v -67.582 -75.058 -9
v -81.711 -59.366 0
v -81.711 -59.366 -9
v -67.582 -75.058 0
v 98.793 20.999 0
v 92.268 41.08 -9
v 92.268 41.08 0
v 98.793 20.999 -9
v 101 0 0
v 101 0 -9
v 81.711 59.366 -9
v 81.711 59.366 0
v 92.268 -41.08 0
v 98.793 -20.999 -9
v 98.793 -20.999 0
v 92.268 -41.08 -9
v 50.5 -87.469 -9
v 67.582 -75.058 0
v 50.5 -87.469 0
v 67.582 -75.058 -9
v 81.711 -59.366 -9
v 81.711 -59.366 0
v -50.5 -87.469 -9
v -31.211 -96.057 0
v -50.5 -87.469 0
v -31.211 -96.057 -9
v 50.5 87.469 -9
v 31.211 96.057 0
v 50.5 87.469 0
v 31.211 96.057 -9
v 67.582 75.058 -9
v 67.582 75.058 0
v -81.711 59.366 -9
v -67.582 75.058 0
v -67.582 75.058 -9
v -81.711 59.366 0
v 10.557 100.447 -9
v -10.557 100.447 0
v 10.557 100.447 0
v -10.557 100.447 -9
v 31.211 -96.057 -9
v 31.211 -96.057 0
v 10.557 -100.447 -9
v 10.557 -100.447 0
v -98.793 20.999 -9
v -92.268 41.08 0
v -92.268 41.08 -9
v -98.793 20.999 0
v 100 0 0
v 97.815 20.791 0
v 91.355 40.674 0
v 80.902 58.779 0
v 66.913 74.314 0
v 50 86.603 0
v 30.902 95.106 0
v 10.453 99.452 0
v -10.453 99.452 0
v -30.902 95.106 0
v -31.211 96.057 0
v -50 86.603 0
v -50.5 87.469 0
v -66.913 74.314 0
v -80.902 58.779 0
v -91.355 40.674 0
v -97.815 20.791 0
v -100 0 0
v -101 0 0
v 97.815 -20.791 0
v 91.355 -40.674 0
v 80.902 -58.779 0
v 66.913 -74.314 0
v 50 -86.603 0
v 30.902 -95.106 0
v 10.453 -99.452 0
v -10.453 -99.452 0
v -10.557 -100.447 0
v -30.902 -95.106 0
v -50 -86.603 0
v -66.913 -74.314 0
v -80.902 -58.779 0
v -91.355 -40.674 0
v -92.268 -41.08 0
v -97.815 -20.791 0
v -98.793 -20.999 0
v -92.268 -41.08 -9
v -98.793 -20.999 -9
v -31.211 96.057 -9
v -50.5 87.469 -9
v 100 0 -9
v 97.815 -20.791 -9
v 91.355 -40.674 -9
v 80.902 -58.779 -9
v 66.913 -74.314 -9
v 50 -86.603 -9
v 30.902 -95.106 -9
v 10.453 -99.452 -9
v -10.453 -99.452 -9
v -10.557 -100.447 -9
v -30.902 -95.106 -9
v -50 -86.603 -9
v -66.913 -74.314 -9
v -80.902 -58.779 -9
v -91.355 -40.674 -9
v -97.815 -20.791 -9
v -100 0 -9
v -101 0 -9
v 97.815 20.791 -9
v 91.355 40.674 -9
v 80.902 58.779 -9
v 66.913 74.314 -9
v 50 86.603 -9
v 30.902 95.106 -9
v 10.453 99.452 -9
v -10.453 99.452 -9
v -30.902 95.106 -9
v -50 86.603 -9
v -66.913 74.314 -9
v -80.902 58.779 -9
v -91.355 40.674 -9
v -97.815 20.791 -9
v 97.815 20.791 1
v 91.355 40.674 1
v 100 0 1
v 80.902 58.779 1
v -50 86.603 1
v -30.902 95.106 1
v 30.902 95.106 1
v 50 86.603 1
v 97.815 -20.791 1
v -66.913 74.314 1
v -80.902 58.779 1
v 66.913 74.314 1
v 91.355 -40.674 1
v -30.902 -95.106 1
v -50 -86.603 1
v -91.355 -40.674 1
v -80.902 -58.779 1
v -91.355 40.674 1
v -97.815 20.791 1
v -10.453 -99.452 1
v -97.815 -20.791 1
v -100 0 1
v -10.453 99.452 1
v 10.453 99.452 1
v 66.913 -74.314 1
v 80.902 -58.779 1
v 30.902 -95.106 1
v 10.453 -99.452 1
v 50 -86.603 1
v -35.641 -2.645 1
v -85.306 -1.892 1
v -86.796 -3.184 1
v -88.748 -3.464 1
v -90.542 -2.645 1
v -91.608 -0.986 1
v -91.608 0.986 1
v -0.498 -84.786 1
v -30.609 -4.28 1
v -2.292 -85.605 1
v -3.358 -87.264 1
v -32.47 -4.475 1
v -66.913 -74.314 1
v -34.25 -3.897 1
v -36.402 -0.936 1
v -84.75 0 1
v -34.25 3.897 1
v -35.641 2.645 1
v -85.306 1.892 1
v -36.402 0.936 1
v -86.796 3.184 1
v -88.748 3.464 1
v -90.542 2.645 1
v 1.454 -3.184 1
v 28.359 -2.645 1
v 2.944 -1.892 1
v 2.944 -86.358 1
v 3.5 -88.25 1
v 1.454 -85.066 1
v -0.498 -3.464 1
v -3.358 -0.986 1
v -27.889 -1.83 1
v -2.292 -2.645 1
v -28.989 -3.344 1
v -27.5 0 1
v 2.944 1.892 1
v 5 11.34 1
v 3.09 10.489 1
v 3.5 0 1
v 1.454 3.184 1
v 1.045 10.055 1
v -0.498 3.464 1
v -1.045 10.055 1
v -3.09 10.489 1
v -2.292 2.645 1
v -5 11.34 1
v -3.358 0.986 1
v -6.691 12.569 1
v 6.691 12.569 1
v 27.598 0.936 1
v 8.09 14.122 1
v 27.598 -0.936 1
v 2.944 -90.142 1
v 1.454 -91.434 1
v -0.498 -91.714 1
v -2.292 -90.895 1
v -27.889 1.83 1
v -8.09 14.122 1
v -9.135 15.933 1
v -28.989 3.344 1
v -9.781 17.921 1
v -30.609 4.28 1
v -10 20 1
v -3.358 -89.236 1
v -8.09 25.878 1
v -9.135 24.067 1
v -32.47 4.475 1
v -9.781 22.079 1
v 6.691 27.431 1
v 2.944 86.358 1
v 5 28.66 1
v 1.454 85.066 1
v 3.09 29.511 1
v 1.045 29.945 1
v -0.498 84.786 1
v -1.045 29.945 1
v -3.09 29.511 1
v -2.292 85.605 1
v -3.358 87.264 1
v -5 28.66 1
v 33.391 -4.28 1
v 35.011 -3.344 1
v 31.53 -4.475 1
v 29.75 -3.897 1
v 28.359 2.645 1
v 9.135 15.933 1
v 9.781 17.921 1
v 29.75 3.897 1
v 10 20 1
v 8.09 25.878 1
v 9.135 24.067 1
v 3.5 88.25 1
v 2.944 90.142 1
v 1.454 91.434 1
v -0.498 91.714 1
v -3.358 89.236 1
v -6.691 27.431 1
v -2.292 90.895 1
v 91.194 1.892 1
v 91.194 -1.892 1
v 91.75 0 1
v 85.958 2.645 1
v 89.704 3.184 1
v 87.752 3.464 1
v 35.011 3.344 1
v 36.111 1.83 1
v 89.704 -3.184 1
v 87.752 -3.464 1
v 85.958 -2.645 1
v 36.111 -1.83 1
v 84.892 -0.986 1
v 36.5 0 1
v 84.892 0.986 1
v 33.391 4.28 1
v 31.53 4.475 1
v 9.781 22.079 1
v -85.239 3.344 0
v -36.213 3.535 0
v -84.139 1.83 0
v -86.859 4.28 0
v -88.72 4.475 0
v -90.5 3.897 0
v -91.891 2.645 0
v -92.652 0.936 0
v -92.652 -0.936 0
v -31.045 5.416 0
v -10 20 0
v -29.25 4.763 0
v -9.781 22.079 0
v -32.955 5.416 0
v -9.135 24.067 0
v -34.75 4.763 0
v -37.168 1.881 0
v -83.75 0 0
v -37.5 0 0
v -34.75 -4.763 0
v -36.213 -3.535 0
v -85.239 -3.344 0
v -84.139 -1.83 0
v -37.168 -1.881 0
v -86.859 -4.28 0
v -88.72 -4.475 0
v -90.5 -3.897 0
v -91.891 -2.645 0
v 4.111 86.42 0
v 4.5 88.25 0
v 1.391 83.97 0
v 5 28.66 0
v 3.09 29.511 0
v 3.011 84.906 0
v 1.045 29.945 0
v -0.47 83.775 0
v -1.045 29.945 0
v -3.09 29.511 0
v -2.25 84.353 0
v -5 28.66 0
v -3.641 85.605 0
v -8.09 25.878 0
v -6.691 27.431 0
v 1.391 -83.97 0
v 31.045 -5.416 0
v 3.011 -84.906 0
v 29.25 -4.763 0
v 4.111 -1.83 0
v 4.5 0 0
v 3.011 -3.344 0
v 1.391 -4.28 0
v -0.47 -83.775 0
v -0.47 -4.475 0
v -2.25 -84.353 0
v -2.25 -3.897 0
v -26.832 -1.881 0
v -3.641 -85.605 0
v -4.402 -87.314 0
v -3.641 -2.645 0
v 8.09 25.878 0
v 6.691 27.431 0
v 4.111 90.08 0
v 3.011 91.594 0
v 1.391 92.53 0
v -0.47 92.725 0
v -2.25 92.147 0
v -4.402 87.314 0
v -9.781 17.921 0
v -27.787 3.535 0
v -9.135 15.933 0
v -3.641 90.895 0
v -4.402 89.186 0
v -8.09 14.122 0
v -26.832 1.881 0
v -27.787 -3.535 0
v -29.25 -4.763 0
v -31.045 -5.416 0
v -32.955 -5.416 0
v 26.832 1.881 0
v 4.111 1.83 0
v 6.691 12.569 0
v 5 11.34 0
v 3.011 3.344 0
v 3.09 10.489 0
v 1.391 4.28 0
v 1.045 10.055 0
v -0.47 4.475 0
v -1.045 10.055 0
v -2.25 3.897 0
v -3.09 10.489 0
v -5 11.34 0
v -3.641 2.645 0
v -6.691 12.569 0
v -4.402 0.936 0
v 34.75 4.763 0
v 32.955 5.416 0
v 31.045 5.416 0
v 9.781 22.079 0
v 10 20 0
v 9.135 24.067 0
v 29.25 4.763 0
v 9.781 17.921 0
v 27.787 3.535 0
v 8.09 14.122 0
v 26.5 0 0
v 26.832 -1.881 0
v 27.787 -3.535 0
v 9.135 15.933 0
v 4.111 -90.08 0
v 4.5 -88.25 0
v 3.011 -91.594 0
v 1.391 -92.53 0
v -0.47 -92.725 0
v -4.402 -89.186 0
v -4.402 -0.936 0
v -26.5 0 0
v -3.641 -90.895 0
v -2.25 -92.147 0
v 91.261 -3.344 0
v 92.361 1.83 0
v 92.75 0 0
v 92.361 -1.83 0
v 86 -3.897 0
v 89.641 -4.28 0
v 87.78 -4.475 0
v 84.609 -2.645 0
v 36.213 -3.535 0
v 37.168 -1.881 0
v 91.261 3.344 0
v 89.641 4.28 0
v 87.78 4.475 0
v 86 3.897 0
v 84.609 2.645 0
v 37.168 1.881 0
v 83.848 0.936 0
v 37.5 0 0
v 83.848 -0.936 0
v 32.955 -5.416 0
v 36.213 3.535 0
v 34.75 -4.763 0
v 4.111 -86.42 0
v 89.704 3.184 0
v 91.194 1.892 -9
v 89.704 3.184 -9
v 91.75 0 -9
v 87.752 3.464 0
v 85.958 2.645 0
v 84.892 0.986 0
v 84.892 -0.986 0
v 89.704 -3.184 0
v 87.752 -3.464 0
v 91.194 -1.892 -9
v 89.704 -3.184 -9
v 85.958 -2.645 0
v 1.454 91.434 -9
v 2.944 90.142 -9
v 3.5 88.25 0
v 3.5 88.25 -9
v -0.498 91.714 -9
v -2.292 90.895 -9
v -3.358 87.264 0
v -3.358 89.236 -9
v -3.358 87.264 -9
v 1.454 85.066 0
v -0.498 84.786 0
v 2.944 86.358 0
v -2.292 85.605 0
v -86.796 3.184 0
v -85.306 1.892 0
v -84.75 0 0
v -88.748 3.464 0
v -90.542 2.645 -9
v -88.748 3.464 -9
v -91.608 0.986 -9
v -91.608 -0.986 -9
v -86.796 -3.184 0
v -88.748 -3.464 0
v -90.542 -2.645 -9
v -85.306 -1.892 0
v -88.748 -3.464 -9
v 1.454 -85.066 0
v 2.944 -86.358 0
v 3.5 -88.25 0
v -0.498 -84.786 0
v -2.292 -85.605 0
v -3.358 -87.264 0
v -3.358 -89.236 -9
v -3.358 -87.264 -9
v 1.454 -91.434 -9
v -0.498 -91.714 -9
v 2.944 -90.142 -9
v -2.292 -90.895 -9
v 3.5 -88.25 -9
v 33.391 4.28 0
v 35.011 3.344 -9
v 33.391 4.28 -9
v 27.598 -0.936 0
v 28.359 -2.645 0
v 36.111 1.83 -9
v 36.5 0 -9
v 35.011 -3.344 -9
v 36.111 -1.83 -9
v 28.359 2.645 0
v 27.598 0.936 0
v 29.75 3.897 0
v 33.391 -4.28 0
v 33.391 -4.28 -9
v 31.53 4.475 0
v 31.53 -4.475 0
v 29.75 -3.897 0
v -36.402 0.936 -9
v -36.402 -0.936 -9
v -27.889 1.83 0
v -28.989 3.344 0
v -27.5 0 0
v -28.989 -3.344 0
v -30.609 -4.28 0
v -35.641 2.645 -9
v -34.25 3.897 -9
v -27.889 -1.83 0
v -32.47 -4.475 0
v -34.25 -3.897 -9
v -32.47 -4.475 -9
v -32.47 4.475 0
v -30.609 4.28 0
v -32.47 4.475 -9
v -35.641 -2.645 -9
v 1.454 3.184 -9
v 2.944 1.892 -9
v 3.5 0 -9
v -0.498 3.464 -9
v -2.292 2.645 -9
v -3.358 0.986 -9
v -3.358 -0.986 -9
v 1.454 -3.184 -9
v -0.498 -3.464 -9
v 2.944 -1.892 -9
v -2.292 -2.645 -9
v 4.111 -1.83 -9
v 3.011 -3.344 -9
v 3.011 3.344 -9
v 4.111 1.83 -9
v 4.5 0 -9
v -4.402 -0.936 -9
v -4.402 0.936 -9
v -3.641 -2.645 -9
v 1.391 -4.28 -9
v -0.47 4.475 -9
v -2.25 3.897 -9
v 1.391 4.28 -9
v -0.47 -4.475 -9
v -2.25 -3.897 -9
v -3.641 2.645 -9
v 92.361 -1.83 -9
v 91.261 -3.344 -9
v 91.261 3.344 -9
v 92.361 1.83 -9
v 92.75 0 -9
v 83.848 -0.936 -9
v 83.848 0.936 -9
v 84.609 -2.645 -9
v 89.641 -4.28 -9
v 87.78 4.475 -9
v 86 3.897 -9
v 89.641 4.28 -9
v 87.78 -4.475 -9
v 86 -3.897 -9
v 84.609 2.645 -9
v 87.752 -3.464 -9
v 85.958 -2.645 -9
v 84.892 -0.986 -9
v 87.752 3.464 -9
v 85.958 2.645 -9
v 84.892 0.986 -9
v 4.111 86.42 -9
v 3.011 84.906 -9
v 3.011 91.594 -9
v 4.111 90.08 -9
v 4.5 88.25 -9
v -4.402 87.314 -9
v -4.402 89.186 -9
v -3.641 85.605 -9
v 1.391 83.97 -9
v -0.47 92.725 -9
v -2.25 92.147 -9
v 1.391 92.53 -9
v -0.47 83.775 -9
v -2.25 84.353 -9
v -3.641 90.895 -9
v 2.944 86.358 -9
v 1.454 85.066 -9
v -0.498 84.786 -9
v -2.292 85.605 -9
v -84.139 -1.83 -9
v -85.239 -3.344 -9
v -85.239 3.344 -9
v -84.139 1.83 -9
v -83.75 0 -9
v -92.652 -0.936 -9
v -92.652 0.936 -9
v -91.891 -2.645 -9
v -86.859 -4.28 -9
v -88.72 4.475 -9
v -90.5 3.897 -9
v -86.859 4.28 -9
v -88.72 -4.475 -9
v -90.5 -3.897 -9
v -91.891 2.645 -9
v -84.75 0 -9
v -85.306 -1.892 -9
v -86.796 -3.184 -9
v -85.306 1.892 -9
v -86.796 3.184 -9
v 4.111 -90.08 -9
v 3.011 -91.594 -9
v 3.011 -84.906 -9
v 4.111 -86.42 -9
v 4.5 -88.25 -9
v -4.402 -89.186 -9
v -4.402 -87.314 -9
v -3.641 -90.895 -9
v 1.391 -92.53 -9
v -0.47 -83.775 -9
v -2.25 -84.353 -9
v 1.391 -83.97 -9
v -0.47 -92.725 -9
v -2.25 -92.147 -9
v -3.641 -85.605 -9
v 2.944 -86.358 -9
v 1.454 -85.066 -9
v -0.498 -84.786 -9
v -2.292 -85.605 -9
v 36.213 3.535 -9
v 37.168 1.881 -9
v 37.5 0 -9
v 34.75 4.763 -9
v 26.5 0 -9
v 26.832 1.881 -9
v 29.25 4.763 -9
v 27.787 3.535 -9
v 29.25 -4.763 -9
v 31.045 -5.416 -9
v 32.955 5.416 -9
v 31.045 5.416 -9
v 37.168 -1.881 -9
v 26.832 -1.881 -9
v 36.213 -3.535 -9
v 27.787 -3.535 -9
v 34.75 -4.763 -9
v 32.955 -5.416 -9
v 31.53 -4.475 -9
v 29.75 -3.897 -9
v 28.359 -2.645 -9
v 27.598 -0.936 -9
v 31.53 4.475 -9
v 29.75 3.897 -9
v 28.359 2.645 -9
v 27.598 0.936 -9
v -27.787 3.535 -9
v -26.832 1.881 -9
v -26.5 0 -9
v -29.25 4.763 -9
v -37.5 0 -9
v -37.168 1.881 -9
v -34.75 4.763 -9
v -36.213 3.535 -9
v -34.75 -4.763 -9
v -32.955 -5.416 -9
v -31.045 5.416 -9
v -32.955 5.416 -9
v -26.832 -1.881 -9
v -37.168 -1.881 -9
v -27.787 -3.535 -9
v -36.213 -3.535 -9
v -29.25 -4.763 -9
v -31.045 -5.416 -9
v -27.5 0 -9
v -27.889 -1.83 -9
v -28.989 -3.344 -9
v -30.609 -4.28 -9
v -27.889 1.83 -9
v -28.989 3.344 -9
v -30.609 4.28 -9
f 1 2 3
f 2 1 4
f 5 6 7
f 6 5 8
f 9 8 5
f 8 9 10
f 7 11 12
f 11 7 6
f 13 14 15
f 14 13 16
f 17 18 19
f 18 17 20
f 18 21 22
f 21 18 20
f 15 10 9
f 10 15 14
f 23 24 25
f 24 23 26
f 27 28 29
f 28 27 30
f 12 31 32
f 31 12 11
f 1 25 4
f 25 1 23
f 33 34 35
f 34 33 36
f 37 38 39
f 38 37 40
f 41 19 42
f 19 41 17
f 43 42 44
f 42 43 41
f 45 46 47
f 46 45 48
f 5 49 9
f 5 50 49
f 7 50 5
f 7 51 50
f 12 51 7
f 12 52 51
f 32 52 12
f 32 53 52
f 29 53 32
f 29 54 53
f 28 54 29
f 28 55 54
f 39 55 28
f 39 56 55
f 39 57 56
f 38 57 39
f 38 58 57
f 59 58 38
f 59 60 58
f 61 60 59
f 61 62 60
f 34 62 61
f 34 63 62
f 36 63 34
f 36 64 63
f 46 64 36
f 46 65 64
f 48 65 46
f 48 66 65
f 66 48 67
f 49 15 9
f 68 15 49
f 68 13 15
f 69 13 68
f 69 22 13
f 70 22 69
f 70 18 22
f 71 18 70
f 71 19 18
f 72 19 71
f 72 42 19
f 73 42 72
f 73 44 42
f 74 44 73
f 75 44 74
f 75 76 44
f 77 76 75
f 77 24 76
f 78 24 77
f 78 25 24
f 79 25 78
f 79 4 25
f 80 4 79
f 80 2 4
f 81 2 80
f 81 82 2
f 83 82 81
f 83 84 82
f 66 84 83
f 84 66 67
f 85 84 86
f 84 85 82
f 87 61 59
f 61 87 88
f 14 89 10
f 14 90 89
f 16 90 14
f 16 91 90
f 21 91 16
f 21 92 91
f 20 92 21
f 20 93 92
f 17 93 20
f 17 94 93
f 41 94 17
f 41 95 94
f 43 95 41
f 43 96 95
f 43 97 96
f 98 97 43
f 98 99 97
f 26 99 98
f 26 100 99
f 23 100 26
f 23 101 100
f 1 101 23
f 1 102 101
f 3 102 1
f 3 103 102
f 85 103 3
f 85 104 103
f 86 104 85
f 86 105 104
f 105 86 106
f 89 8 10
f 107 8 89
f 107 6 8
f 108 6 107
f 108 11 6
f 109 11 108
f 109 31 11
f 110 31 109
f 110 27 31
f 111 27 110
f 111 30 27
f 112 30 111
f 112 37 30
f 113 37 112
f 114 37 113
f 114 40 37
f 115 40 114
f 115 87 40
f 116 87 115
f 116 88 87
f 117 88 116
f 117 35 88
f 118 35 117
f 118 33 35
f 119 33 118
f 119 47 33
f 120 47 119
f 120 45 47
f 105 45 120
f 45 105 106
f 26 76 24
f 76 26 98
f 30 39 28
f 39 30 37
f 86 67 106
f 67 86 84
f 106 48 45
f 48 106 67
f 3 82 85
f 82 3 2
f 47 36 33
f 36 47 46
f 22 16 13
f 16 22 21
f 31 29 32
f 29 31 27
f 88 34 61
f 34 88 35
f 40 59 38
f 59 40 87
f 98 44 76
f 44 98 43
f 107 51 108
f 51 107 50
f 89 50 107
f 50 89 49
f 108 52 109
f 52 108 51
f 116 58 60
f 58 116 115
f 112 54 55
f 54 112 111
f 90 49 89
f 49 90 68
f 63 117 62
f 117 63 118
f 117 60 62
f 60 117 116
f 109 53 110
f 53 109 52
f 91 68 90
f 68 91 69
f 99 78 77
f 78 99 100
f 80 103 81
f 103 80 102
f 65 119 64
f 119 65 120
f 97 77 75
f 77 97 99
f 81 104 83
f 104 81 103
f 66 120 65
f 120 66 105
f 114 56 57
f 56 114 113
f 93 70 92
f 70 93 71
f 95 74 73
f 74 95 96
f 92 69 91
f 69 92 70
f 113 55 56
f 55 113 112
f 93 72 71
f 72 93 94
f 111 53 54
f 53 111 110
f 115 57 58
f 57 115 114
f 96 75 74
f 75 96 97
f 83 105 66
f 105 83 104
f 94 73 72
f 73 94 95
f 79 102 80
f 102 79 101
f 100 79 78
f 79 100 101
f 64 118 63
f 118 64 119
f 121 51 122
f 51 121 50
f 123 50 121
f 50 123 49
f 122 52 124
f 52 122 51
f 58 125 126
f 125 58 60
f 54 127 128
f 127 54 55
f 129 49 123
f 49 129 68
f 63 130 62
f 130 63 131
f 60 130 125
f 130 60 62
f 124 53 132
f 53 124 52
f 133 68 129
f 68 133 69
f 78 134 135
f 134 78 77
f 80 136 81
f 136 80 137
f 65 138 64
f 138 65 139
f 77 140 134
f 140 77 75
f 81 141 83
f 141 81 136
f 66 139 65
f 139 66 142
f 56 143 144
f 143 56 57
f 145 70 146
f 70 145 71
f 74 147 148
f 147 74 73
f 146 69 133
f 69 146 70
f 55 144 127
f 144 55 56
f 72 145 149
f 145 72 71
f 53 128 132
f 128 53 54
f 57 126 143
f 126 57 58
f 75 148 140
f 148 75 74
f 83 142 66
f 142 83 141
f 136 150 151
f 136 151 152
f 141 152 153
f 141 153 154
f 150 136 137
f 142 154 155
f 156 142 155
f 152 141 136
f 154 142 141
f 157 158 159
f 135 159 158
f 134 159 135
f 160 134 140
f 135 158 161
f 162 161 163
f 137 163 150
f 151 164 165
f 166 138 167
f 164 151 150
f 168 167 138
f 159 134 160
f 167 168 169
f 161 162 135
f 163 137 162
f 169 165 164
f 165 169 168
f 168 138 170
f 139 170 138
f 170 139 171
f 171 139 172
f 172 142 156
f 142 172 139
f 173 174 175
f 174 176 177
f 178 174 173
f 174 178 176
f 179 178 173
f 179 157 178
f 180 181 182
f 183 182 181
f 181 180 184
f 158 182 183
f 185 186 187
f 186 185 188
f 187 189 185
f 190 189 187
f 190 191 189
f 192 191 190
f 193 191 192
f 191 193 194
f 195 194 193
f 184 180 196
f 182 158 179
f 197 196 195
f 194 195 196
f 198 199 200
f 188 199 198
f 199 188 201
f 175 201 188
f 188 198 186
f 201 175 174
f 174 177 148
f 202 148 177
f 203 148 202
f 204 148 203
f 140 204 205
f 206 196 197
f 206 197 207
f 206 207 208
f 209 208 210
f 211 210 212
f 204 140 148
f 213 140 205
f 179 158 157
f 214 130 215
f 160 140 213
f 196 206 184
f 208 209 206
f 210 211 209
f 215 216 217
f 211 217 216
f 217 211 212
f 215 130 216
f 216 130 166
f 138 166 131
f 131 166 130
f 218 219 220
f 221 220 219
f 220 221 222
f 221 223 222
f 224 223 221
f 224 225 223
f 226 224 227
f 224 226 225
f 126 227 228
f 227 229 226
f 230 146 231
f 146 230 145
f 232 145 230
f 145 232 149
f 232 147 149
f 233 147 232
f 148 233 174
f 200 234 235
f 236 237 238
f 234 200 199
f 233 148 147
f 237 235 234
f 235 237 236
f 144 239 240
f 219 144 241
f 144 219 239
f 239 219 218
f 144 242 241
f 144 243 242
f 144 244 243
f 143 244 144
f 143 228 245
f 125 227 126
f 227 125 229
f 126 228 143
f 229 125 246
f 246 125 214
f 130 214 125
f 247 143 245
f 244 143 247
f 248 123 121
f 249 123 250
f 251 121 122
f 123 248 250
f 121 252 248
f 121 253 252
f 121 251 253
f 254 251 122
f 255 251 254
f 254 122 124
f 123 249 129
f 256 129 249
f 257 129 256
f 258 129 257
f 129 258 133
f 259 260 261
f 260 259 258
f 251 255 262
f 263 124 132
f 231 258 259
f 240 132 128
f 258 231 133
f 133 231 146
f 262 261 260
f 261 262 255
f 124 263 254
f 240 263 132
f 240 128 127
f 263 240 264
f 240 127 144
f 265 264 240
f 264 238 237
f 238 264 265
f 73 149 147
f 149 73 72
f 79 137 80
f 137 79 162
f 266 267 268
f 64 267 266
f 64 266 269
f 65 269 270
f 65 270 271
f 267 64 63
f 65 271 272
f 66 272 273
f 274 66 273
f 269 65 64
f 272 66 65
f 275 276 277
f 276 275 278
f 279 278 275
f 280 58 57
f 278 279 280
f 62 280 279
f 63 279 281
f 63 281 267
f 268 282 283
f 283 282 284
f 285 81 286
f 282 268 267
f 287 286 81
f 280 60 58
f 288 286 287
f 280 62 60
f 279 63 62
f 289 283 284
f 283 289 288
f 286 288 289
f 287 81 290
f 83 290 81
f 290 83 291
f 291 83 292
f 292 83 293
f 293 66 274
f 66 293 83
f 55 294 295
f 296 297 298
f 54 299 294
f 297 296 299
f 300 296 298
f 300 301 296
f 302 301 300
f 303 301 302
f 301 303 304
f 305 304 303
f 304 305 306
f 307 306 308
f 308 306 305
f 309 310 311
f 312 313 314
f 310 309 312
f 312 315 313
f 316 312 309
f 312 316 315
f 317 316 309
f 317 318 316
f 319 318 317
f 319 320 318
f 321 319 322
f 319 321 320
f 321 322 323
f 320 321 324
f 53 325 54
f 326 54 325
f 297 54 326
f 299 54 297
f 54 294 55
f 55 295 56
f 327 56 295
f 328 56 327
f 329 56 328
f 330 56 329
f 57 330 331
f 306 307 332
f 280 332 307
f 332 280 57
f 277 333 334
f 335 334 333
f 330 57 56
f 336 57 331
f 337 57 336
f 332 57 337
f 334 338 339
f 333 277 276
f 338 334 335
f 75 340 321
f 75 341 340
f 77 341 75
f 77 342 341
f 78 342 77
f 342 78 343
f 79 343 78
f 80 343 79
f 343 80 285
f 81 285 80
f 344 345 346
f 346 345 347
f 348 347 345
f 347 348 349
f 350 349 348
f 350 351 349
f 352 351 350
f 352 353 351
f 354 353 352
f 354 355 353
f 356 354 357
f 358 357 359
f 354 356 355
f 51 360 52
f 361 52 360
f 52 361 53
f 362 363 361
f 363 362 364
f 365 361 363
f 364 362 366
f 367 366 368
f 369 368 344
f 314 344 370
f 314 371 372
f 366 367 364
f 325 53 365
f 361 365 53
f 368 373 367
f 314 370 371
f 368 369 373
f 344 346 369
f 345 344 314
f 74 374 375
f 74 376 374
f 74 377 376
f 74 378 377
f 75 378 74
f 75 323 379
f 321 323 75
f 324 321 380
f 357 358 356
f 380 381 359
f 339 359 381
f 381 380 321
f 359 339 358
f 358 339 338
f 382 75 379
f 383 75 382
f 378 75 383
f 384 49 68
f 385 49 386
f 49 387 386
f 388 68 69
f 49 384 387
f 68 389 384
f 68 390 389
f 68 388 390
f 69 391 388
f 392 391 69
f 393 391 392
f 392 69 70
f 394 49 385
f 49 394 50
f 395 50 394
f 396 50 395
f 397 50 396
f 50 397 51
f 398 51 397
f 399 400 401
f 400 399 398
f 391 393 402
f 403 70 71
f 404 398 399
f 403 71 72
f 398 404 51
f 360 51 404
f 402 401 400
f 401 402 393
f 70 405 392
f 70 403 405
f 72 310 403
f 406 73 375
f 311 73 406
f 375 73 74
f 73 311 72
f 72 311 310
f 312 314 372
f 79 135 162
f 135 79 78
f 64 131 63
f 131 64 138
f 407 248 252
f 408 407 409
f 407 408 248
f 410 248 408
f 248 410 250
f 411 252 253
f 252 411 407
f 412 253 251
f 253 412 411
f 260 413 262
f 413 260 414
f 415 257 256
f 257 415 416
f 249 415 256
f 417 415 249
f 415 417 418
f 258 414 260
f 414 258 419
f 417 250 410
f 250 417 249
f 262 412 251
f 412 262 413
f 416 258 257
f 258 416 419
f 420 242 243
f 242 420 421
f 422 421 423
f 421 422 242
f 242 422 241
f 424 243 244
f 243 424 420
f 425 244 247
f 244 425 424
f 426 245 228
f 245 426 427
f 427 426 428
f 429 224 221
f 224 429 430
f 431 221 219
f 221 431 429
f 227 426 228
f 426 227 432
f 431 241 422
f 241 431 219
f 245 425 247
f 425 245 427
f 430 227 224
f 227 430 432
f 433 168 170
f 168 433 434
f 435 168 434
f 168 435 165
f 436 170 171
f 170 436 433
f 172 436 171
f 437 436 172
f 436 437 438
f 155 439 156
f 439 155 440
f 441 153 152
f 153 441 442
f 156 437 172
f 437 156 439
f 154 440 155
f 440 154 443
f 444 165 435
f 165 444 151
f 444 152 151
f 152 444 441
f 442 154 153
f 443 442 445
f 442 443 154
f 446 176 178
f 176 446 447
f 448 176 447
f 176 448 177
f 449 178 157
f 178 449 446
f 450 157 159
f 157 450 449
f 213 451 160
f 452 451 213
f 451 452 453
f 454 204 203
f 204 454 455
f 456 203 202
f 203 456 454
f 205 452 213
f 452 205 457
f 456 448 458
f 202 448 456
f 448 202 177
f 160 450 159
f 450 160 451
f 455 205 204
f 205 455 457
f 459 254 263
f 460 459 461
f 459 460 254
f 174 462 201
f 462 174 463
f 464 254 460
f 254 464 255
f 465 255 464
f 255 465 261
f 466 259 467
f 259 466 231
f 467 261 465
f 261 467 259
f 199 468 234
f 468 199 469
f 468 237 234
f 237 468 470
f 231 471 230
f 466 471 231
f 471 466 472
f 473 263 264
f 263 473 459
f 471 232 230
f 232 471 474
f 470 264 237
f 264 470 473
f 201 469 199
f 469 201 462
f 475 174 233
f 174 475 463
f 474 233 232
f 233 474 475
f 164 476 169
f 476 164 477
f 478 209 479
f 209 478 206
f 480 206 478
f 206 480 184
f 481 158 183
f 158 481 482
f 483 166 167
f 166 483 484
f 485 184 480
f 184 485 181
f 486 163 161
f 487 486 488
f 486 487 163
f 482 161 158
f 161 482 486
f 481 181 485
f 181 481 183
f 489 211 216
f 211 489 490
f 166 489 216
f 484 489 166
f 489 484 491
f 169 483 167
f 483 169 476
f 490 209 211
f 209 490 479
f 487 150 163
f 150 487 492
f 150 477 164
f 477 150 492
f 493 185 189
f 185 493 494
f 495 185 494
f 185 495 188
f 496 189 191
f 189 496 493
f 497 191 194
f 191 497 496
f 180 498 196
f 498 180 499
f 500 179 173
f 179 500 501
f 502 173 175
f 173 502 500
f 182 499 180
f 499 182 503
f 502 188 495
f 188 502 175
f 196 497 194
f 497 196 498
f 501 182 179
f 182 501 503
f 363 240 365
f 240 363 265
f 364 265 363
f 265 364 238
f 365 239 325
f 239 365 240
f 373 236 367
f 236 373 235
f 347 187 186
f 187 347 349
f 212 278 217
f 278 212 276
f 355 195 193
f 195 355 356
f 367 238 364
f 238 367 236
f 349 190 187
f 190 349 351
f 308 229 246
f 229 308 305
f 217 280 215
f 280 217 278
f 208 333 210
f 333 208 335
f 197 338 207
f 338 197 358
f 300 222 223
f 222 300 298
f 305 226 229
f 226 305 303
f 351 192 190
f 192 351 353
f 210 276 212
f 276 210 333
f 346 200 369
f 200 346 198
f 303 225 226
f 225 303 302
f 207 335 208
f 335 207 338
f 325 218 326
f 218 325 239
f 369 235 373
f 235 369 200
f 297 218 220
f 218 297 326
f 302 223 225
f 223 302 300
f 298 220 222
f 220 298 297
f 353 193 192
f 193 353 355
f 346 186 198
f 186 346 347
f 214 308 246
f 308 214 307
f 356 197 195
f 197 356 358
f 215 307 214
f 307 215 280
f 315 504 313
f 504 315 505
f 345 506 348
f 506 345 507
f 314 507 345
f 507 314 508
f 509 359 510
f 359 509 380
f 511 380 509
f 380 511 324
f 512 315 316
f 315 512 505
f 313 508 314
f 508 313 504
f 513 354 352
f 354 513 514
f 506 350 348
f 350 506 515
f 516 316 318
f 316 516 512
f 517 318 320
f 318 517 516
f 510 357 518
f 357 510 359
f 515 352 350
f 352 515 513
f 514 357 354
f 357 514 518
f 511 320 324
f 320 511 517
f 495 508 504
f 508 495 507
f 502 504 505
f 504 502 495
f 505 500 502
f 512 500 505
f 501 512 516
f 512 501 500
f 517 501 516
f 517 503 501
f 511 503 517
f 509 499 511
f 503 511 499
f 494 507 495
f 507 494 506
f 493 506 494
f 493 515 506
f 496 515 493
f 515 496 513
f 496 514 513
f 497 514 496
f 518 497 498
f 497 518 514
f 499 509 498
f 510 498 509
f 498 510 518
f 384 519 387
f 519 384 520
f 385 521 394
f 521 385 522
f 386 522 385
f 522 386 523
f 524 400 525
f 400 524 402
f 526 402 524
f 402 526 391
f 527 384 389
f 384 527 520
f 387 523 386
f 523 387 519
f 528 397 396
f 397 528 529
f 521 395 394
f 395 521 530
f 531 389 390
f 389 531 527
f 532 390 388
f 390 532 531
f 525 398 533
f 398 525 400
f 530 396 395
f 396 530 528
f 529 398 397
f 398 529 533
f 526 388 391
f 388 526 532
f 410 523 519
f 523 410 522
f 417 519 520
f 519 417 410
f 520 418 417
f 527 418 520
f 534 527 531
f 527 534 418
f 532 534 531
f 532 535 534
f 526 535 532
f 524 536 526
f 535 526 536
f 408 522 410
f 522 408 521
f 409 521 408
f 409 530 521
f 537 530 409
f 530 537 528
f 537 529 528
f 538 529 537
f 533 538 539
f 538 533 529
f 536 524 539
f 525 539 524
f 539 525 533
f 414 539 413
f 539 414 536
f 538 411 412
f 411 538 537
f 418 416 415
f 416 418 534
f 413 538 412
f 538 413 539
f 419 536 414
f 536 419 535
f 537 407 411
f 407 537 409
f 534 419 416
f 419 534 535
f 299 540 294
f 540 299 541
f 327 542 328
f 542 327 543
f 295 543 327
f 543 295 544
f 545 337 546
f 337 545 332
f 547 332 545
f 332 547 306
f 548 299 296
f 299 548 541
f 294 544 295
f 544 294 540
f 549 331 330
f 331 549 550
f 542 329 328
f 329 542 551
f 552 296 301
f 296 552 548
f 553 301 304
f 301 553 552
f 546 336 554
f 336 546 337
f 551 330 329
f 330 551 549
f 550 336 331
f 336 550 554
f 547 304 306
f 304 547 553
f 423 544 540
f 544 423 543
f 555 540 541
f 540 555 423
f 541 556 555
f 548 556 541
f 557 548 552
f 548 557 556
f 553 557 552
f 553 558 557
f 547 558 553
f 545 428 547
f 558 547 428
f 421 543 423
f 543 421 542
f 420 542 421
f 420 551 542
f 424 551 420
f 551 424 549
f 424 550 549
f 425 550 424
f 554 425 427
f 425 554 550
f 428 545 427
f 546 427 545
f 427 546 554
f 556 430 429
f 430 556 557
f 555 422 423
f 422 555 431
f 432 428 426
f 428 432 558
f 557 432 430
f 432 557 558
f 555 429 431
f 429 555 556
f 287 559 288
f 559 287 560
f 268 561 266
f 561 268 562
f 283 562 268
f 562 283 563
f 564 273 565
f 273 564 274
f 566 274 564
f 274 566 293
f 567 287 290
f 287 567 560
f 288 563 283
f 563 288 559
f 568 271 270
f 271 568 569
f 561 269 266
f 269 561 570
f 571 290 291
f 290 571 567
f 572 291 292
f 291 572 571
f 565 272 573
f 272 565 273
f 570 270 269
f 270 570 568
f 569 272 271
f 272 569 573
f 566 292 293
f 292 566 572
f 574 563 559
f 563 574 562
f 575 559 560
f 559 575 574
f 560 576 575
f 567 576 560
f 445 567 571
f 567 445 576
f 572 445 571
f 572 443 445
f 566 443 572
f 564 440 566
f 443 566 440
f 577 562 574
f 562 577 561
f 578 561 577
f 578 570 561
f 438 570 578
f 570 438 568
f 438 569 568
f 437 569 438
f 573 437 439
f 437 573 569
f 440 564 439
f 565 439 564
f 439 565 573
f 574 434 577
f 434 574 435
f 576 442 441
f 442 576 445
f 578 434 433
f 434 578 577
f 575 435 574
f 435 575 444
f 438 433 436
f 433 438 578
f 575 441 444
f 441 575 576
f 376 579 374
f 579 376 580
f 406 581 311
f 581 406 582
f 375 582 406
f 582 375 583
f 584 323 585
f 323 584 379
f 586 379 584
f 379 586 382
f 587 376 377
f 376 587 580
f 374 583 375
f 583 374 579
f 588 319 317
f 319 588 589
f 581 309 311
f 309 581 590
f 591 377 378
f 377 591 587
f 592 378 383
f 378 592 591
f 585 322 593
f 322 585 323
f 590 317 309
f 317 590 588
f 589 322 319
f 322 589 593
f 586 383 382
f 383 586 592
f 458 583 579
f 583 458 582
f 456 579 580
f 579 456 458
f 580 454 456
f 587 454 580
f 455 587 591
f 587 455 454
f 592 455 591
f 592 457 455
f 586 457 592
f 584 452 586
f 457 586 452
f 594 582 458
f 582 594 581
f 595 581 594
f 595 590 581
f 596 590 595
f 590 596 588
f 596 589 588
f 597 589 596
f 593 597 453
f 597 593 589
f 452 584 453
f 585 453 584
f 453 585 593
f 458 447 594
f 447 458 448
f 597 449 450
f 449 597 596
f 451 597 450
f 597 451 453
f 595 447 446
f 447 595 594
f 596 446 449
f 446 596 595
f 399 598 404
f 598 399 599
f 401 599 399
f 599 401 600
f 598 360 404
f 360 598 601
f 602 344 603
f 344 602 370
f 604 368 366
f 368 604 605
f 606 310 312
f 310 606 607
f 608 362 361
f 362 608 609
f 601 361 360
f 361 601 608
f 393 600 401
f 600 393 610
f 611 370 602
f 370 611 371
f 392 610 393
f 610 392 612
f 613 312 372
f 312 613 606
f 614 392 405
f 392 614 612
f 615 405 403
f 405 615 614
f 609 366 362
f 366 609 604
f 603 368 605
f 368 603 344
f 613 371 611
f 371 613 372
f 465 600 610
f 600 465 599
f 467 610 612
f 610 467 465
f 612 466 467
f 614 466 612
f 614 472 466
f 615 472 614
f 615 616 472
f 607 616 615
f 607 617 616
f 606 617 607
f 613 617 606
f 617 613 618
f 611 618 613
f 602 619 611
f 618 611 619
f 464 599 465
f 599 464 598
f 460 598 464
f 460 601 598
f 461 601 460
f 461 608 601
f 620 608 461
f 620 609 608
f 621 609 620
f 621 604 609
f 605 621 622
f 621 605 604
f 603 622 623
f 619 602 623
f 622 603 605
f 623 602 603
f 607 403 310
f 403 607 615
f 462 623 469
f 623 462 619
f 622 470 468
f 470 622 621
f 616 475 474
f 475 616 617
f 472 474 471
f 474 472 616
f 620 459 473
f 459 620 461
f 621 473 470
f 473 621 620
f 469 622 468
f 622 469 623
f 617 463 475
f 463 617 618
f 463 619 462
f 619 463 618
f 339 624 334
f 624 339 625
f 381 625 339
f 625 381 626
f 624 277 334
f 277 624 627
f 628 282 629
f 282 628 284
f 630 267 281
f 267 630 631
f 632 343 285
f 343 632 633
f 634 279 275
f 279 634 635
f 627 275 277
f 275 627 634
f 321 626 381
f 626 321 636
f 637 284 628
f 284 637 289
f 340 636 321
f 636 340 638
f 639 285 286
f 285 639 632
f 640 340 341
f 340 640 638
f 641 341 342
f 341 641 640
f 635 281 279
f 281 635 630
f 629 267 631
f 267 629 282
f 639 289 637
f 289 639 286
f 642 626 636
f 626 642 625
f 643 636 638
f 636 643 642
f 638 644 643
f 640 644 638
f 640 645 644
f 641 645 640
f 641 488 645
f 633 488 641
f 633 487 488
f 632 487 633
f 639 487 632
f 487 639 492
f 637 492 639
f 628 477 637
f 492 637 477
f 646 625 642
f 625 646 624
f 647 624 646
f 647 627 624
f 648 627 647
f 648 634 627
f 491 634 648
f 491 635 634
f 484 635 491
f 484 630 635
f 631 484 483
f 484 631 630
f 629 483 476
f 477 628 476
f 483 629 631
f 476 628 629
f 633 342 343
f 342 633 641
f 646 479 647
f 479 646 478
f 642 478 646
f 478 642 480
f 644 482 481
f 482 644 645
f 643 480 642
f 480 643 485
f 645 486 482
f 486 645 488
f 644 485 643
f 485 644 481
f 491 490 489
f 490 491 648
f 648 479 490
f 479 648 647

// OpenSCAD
radius = 100;
outerBorderThickness = 1;

innerRadius = 39;
innerBorderThickness = 1;

bottomThickness = 1;
height = 10 - bottomThickness;



holeDistanceFromSide = 11.75;
guiderRodDistanceFromMiddle = 32;
tubeHoldeDistanceFromMiddle = 20;

rodBorderThickness = 1;
threadedRodRadius = 3.5;
guiderRodRadius = 4 + .5;

tubeHoleRadius = 10;




mirror([0, 0, 1]) {
    
    // Main frame
    pillar(radius, outerBorderThickness, height);
    //pillar(innerRadius, innerBorderThickness, 1);

    // Bottom plate
    difference() {
        // Plate
        translate([0, 0, -bottomThickness]) {
            cylinder(bottomThickness, radius, radius);
        }
        
        // threaded rods
        translate([radius - holeDistanceFromSide, 0, -bottomThickness]) {
            cylinder(bottomThickness, threadedRodRadius, threadedRodRadius);
        }
        translate([0, radius - holeDistanceFromSide, -bottomThickness]) {
            cylinder(bottomThickness, threadedRodRadius, threadedRodRadius);
        }

        translate([-(radius - holeDistanceFromSide), 0, -bottomThickness]) {
            cylinder(bottomThickness, threadedRodRadius, threadedRodRadius);
        }

        translate([0, -(radius - holeDistanceFromSide), -bottomThickness]) {
            cylinder(bottomThickness, threadedRodRadius, threadedRodRadius);
        }
           
        
        
        // Inner rods: guide and threaded
            
        translate([guiderRodDistanceFromMiddle, 0, -bottomThickness]) {
            cylinder(bottomThickness, guiderRodRadius, guiderRodRadius);
        }

        translate([-guiderRodDistanceFromMiddle, 0, -bottomThickness]) {
            cylinder(bottomThickness, guiderRodRadius, guiderRodRadius);
        }

        translate([0, 0, -bottomThickness]) {
            cylinder(bottomThickness, threadedRodRadius, threadedRodRadius);
        }
        
        // Tube Hole
        translate([0, tubeHoldeDistanceFromMiddle, -bottomThickness]) {
            cylinder(bottomThickness, tubeHoleRadius, tubeHoleRadius);
        }
        
        
        
    }



    // Structural threaded rods
    translate([radius - holeDistanceFromSide, 0, 0]) {
        pillar(threadedRodRadius, rodBorderThickness, height);
    }

    translate([0, radius - holeDistanceFromSide, 0]) {
        pillar(threadedRodRadius, rodBorderThickness, height);
    }

    translate([-(radius - holeDistanceFromSide), 0, 0]) {
        pillar(threadedRodRadius, rodBorderThickness, height);
    }

    translate([0, -(radius - holeDistanceFromSide), 0]) {
        pillar(threadedRodRadius, rodBorderThickness, height);
    }



    // Guiders

    translate([guiderRodDistanceFromMiddle, 0, 0]) {
        pillar(guiderRodRadius, rodBorderThickness, height);
    }

    translate([-guiderRodDistanceFromMiddle, 0, 0]) {
        pillar(guiderRodRadius, rodBorderThickness, height);
    }


    // Moving threaded rod
    pillar(threadedRodRadius, rodBorderThickness, height);
}




module pillar(innerRadius, thickness, height) {
    difference() {
        cylinder(height, innerRadius + thickness, innerRadius + thickness);
        cylinder(height, innerRadius, innerRadius);
    }
}
/*


  
module segment(innerWidth = 50) {
    
    cube([holeDepth + deviderDepth, (outerWidth - innerWidth) / 2, height]);

    translate([0, 0, 0])
      cube([deviderDepth, outerWidth, height]);
  

    translate([0, outerWidth - (outerWidth - innerWidth) / 2, 0])
       cube([holeDepth + deviderDepth, (outerWidth - innerWidth) / 2, height]);

}


segments = 72;
sidePatternDomain = 15;

smallSegmentWidth = 10;
mediumSegmentWidth = 40;
largeSegmentWidth = 90;
// middel = 13
// klein = 9

for (i = [0:1:segments]) 
{   
    translate([i * (deviderDepth + holeDepth), 0, 0]) {
        
        if (i > sidePatternDomain && i < segments - sidePatternDomain)
        {
            if (i % 2 == 0) 
            {
                if (i % 3 == 0)
                {
                    segment(mediumSegmentWidth);
                } else {
                    segment(largeSegmentWidth);
                }
            } else {
                if (i % 3 == 0)
                {
                    segment(mediumSegmentWidth);
                } else { 
                    segment(smallSegmentWidth);
                }
            }
        } else {
            if (i % 2 == 1) //(i < segments / 2 ? 1 : 0)) 
            {
                segment(smallSegmentWidth);
            } else {
                segment(largeSegmentWidth);
            }
        }
        
    }
}

translate([(segments + 1) * (deviderDepth + holeDepth), 0, 0])
    cube([borderDepth, outerWidth, height]);

translate([-borderDepth + deviderDepth, 0, 0])
    cube([borderDepth - deviderDepth, outerWidth, height]);
    
    
    */
